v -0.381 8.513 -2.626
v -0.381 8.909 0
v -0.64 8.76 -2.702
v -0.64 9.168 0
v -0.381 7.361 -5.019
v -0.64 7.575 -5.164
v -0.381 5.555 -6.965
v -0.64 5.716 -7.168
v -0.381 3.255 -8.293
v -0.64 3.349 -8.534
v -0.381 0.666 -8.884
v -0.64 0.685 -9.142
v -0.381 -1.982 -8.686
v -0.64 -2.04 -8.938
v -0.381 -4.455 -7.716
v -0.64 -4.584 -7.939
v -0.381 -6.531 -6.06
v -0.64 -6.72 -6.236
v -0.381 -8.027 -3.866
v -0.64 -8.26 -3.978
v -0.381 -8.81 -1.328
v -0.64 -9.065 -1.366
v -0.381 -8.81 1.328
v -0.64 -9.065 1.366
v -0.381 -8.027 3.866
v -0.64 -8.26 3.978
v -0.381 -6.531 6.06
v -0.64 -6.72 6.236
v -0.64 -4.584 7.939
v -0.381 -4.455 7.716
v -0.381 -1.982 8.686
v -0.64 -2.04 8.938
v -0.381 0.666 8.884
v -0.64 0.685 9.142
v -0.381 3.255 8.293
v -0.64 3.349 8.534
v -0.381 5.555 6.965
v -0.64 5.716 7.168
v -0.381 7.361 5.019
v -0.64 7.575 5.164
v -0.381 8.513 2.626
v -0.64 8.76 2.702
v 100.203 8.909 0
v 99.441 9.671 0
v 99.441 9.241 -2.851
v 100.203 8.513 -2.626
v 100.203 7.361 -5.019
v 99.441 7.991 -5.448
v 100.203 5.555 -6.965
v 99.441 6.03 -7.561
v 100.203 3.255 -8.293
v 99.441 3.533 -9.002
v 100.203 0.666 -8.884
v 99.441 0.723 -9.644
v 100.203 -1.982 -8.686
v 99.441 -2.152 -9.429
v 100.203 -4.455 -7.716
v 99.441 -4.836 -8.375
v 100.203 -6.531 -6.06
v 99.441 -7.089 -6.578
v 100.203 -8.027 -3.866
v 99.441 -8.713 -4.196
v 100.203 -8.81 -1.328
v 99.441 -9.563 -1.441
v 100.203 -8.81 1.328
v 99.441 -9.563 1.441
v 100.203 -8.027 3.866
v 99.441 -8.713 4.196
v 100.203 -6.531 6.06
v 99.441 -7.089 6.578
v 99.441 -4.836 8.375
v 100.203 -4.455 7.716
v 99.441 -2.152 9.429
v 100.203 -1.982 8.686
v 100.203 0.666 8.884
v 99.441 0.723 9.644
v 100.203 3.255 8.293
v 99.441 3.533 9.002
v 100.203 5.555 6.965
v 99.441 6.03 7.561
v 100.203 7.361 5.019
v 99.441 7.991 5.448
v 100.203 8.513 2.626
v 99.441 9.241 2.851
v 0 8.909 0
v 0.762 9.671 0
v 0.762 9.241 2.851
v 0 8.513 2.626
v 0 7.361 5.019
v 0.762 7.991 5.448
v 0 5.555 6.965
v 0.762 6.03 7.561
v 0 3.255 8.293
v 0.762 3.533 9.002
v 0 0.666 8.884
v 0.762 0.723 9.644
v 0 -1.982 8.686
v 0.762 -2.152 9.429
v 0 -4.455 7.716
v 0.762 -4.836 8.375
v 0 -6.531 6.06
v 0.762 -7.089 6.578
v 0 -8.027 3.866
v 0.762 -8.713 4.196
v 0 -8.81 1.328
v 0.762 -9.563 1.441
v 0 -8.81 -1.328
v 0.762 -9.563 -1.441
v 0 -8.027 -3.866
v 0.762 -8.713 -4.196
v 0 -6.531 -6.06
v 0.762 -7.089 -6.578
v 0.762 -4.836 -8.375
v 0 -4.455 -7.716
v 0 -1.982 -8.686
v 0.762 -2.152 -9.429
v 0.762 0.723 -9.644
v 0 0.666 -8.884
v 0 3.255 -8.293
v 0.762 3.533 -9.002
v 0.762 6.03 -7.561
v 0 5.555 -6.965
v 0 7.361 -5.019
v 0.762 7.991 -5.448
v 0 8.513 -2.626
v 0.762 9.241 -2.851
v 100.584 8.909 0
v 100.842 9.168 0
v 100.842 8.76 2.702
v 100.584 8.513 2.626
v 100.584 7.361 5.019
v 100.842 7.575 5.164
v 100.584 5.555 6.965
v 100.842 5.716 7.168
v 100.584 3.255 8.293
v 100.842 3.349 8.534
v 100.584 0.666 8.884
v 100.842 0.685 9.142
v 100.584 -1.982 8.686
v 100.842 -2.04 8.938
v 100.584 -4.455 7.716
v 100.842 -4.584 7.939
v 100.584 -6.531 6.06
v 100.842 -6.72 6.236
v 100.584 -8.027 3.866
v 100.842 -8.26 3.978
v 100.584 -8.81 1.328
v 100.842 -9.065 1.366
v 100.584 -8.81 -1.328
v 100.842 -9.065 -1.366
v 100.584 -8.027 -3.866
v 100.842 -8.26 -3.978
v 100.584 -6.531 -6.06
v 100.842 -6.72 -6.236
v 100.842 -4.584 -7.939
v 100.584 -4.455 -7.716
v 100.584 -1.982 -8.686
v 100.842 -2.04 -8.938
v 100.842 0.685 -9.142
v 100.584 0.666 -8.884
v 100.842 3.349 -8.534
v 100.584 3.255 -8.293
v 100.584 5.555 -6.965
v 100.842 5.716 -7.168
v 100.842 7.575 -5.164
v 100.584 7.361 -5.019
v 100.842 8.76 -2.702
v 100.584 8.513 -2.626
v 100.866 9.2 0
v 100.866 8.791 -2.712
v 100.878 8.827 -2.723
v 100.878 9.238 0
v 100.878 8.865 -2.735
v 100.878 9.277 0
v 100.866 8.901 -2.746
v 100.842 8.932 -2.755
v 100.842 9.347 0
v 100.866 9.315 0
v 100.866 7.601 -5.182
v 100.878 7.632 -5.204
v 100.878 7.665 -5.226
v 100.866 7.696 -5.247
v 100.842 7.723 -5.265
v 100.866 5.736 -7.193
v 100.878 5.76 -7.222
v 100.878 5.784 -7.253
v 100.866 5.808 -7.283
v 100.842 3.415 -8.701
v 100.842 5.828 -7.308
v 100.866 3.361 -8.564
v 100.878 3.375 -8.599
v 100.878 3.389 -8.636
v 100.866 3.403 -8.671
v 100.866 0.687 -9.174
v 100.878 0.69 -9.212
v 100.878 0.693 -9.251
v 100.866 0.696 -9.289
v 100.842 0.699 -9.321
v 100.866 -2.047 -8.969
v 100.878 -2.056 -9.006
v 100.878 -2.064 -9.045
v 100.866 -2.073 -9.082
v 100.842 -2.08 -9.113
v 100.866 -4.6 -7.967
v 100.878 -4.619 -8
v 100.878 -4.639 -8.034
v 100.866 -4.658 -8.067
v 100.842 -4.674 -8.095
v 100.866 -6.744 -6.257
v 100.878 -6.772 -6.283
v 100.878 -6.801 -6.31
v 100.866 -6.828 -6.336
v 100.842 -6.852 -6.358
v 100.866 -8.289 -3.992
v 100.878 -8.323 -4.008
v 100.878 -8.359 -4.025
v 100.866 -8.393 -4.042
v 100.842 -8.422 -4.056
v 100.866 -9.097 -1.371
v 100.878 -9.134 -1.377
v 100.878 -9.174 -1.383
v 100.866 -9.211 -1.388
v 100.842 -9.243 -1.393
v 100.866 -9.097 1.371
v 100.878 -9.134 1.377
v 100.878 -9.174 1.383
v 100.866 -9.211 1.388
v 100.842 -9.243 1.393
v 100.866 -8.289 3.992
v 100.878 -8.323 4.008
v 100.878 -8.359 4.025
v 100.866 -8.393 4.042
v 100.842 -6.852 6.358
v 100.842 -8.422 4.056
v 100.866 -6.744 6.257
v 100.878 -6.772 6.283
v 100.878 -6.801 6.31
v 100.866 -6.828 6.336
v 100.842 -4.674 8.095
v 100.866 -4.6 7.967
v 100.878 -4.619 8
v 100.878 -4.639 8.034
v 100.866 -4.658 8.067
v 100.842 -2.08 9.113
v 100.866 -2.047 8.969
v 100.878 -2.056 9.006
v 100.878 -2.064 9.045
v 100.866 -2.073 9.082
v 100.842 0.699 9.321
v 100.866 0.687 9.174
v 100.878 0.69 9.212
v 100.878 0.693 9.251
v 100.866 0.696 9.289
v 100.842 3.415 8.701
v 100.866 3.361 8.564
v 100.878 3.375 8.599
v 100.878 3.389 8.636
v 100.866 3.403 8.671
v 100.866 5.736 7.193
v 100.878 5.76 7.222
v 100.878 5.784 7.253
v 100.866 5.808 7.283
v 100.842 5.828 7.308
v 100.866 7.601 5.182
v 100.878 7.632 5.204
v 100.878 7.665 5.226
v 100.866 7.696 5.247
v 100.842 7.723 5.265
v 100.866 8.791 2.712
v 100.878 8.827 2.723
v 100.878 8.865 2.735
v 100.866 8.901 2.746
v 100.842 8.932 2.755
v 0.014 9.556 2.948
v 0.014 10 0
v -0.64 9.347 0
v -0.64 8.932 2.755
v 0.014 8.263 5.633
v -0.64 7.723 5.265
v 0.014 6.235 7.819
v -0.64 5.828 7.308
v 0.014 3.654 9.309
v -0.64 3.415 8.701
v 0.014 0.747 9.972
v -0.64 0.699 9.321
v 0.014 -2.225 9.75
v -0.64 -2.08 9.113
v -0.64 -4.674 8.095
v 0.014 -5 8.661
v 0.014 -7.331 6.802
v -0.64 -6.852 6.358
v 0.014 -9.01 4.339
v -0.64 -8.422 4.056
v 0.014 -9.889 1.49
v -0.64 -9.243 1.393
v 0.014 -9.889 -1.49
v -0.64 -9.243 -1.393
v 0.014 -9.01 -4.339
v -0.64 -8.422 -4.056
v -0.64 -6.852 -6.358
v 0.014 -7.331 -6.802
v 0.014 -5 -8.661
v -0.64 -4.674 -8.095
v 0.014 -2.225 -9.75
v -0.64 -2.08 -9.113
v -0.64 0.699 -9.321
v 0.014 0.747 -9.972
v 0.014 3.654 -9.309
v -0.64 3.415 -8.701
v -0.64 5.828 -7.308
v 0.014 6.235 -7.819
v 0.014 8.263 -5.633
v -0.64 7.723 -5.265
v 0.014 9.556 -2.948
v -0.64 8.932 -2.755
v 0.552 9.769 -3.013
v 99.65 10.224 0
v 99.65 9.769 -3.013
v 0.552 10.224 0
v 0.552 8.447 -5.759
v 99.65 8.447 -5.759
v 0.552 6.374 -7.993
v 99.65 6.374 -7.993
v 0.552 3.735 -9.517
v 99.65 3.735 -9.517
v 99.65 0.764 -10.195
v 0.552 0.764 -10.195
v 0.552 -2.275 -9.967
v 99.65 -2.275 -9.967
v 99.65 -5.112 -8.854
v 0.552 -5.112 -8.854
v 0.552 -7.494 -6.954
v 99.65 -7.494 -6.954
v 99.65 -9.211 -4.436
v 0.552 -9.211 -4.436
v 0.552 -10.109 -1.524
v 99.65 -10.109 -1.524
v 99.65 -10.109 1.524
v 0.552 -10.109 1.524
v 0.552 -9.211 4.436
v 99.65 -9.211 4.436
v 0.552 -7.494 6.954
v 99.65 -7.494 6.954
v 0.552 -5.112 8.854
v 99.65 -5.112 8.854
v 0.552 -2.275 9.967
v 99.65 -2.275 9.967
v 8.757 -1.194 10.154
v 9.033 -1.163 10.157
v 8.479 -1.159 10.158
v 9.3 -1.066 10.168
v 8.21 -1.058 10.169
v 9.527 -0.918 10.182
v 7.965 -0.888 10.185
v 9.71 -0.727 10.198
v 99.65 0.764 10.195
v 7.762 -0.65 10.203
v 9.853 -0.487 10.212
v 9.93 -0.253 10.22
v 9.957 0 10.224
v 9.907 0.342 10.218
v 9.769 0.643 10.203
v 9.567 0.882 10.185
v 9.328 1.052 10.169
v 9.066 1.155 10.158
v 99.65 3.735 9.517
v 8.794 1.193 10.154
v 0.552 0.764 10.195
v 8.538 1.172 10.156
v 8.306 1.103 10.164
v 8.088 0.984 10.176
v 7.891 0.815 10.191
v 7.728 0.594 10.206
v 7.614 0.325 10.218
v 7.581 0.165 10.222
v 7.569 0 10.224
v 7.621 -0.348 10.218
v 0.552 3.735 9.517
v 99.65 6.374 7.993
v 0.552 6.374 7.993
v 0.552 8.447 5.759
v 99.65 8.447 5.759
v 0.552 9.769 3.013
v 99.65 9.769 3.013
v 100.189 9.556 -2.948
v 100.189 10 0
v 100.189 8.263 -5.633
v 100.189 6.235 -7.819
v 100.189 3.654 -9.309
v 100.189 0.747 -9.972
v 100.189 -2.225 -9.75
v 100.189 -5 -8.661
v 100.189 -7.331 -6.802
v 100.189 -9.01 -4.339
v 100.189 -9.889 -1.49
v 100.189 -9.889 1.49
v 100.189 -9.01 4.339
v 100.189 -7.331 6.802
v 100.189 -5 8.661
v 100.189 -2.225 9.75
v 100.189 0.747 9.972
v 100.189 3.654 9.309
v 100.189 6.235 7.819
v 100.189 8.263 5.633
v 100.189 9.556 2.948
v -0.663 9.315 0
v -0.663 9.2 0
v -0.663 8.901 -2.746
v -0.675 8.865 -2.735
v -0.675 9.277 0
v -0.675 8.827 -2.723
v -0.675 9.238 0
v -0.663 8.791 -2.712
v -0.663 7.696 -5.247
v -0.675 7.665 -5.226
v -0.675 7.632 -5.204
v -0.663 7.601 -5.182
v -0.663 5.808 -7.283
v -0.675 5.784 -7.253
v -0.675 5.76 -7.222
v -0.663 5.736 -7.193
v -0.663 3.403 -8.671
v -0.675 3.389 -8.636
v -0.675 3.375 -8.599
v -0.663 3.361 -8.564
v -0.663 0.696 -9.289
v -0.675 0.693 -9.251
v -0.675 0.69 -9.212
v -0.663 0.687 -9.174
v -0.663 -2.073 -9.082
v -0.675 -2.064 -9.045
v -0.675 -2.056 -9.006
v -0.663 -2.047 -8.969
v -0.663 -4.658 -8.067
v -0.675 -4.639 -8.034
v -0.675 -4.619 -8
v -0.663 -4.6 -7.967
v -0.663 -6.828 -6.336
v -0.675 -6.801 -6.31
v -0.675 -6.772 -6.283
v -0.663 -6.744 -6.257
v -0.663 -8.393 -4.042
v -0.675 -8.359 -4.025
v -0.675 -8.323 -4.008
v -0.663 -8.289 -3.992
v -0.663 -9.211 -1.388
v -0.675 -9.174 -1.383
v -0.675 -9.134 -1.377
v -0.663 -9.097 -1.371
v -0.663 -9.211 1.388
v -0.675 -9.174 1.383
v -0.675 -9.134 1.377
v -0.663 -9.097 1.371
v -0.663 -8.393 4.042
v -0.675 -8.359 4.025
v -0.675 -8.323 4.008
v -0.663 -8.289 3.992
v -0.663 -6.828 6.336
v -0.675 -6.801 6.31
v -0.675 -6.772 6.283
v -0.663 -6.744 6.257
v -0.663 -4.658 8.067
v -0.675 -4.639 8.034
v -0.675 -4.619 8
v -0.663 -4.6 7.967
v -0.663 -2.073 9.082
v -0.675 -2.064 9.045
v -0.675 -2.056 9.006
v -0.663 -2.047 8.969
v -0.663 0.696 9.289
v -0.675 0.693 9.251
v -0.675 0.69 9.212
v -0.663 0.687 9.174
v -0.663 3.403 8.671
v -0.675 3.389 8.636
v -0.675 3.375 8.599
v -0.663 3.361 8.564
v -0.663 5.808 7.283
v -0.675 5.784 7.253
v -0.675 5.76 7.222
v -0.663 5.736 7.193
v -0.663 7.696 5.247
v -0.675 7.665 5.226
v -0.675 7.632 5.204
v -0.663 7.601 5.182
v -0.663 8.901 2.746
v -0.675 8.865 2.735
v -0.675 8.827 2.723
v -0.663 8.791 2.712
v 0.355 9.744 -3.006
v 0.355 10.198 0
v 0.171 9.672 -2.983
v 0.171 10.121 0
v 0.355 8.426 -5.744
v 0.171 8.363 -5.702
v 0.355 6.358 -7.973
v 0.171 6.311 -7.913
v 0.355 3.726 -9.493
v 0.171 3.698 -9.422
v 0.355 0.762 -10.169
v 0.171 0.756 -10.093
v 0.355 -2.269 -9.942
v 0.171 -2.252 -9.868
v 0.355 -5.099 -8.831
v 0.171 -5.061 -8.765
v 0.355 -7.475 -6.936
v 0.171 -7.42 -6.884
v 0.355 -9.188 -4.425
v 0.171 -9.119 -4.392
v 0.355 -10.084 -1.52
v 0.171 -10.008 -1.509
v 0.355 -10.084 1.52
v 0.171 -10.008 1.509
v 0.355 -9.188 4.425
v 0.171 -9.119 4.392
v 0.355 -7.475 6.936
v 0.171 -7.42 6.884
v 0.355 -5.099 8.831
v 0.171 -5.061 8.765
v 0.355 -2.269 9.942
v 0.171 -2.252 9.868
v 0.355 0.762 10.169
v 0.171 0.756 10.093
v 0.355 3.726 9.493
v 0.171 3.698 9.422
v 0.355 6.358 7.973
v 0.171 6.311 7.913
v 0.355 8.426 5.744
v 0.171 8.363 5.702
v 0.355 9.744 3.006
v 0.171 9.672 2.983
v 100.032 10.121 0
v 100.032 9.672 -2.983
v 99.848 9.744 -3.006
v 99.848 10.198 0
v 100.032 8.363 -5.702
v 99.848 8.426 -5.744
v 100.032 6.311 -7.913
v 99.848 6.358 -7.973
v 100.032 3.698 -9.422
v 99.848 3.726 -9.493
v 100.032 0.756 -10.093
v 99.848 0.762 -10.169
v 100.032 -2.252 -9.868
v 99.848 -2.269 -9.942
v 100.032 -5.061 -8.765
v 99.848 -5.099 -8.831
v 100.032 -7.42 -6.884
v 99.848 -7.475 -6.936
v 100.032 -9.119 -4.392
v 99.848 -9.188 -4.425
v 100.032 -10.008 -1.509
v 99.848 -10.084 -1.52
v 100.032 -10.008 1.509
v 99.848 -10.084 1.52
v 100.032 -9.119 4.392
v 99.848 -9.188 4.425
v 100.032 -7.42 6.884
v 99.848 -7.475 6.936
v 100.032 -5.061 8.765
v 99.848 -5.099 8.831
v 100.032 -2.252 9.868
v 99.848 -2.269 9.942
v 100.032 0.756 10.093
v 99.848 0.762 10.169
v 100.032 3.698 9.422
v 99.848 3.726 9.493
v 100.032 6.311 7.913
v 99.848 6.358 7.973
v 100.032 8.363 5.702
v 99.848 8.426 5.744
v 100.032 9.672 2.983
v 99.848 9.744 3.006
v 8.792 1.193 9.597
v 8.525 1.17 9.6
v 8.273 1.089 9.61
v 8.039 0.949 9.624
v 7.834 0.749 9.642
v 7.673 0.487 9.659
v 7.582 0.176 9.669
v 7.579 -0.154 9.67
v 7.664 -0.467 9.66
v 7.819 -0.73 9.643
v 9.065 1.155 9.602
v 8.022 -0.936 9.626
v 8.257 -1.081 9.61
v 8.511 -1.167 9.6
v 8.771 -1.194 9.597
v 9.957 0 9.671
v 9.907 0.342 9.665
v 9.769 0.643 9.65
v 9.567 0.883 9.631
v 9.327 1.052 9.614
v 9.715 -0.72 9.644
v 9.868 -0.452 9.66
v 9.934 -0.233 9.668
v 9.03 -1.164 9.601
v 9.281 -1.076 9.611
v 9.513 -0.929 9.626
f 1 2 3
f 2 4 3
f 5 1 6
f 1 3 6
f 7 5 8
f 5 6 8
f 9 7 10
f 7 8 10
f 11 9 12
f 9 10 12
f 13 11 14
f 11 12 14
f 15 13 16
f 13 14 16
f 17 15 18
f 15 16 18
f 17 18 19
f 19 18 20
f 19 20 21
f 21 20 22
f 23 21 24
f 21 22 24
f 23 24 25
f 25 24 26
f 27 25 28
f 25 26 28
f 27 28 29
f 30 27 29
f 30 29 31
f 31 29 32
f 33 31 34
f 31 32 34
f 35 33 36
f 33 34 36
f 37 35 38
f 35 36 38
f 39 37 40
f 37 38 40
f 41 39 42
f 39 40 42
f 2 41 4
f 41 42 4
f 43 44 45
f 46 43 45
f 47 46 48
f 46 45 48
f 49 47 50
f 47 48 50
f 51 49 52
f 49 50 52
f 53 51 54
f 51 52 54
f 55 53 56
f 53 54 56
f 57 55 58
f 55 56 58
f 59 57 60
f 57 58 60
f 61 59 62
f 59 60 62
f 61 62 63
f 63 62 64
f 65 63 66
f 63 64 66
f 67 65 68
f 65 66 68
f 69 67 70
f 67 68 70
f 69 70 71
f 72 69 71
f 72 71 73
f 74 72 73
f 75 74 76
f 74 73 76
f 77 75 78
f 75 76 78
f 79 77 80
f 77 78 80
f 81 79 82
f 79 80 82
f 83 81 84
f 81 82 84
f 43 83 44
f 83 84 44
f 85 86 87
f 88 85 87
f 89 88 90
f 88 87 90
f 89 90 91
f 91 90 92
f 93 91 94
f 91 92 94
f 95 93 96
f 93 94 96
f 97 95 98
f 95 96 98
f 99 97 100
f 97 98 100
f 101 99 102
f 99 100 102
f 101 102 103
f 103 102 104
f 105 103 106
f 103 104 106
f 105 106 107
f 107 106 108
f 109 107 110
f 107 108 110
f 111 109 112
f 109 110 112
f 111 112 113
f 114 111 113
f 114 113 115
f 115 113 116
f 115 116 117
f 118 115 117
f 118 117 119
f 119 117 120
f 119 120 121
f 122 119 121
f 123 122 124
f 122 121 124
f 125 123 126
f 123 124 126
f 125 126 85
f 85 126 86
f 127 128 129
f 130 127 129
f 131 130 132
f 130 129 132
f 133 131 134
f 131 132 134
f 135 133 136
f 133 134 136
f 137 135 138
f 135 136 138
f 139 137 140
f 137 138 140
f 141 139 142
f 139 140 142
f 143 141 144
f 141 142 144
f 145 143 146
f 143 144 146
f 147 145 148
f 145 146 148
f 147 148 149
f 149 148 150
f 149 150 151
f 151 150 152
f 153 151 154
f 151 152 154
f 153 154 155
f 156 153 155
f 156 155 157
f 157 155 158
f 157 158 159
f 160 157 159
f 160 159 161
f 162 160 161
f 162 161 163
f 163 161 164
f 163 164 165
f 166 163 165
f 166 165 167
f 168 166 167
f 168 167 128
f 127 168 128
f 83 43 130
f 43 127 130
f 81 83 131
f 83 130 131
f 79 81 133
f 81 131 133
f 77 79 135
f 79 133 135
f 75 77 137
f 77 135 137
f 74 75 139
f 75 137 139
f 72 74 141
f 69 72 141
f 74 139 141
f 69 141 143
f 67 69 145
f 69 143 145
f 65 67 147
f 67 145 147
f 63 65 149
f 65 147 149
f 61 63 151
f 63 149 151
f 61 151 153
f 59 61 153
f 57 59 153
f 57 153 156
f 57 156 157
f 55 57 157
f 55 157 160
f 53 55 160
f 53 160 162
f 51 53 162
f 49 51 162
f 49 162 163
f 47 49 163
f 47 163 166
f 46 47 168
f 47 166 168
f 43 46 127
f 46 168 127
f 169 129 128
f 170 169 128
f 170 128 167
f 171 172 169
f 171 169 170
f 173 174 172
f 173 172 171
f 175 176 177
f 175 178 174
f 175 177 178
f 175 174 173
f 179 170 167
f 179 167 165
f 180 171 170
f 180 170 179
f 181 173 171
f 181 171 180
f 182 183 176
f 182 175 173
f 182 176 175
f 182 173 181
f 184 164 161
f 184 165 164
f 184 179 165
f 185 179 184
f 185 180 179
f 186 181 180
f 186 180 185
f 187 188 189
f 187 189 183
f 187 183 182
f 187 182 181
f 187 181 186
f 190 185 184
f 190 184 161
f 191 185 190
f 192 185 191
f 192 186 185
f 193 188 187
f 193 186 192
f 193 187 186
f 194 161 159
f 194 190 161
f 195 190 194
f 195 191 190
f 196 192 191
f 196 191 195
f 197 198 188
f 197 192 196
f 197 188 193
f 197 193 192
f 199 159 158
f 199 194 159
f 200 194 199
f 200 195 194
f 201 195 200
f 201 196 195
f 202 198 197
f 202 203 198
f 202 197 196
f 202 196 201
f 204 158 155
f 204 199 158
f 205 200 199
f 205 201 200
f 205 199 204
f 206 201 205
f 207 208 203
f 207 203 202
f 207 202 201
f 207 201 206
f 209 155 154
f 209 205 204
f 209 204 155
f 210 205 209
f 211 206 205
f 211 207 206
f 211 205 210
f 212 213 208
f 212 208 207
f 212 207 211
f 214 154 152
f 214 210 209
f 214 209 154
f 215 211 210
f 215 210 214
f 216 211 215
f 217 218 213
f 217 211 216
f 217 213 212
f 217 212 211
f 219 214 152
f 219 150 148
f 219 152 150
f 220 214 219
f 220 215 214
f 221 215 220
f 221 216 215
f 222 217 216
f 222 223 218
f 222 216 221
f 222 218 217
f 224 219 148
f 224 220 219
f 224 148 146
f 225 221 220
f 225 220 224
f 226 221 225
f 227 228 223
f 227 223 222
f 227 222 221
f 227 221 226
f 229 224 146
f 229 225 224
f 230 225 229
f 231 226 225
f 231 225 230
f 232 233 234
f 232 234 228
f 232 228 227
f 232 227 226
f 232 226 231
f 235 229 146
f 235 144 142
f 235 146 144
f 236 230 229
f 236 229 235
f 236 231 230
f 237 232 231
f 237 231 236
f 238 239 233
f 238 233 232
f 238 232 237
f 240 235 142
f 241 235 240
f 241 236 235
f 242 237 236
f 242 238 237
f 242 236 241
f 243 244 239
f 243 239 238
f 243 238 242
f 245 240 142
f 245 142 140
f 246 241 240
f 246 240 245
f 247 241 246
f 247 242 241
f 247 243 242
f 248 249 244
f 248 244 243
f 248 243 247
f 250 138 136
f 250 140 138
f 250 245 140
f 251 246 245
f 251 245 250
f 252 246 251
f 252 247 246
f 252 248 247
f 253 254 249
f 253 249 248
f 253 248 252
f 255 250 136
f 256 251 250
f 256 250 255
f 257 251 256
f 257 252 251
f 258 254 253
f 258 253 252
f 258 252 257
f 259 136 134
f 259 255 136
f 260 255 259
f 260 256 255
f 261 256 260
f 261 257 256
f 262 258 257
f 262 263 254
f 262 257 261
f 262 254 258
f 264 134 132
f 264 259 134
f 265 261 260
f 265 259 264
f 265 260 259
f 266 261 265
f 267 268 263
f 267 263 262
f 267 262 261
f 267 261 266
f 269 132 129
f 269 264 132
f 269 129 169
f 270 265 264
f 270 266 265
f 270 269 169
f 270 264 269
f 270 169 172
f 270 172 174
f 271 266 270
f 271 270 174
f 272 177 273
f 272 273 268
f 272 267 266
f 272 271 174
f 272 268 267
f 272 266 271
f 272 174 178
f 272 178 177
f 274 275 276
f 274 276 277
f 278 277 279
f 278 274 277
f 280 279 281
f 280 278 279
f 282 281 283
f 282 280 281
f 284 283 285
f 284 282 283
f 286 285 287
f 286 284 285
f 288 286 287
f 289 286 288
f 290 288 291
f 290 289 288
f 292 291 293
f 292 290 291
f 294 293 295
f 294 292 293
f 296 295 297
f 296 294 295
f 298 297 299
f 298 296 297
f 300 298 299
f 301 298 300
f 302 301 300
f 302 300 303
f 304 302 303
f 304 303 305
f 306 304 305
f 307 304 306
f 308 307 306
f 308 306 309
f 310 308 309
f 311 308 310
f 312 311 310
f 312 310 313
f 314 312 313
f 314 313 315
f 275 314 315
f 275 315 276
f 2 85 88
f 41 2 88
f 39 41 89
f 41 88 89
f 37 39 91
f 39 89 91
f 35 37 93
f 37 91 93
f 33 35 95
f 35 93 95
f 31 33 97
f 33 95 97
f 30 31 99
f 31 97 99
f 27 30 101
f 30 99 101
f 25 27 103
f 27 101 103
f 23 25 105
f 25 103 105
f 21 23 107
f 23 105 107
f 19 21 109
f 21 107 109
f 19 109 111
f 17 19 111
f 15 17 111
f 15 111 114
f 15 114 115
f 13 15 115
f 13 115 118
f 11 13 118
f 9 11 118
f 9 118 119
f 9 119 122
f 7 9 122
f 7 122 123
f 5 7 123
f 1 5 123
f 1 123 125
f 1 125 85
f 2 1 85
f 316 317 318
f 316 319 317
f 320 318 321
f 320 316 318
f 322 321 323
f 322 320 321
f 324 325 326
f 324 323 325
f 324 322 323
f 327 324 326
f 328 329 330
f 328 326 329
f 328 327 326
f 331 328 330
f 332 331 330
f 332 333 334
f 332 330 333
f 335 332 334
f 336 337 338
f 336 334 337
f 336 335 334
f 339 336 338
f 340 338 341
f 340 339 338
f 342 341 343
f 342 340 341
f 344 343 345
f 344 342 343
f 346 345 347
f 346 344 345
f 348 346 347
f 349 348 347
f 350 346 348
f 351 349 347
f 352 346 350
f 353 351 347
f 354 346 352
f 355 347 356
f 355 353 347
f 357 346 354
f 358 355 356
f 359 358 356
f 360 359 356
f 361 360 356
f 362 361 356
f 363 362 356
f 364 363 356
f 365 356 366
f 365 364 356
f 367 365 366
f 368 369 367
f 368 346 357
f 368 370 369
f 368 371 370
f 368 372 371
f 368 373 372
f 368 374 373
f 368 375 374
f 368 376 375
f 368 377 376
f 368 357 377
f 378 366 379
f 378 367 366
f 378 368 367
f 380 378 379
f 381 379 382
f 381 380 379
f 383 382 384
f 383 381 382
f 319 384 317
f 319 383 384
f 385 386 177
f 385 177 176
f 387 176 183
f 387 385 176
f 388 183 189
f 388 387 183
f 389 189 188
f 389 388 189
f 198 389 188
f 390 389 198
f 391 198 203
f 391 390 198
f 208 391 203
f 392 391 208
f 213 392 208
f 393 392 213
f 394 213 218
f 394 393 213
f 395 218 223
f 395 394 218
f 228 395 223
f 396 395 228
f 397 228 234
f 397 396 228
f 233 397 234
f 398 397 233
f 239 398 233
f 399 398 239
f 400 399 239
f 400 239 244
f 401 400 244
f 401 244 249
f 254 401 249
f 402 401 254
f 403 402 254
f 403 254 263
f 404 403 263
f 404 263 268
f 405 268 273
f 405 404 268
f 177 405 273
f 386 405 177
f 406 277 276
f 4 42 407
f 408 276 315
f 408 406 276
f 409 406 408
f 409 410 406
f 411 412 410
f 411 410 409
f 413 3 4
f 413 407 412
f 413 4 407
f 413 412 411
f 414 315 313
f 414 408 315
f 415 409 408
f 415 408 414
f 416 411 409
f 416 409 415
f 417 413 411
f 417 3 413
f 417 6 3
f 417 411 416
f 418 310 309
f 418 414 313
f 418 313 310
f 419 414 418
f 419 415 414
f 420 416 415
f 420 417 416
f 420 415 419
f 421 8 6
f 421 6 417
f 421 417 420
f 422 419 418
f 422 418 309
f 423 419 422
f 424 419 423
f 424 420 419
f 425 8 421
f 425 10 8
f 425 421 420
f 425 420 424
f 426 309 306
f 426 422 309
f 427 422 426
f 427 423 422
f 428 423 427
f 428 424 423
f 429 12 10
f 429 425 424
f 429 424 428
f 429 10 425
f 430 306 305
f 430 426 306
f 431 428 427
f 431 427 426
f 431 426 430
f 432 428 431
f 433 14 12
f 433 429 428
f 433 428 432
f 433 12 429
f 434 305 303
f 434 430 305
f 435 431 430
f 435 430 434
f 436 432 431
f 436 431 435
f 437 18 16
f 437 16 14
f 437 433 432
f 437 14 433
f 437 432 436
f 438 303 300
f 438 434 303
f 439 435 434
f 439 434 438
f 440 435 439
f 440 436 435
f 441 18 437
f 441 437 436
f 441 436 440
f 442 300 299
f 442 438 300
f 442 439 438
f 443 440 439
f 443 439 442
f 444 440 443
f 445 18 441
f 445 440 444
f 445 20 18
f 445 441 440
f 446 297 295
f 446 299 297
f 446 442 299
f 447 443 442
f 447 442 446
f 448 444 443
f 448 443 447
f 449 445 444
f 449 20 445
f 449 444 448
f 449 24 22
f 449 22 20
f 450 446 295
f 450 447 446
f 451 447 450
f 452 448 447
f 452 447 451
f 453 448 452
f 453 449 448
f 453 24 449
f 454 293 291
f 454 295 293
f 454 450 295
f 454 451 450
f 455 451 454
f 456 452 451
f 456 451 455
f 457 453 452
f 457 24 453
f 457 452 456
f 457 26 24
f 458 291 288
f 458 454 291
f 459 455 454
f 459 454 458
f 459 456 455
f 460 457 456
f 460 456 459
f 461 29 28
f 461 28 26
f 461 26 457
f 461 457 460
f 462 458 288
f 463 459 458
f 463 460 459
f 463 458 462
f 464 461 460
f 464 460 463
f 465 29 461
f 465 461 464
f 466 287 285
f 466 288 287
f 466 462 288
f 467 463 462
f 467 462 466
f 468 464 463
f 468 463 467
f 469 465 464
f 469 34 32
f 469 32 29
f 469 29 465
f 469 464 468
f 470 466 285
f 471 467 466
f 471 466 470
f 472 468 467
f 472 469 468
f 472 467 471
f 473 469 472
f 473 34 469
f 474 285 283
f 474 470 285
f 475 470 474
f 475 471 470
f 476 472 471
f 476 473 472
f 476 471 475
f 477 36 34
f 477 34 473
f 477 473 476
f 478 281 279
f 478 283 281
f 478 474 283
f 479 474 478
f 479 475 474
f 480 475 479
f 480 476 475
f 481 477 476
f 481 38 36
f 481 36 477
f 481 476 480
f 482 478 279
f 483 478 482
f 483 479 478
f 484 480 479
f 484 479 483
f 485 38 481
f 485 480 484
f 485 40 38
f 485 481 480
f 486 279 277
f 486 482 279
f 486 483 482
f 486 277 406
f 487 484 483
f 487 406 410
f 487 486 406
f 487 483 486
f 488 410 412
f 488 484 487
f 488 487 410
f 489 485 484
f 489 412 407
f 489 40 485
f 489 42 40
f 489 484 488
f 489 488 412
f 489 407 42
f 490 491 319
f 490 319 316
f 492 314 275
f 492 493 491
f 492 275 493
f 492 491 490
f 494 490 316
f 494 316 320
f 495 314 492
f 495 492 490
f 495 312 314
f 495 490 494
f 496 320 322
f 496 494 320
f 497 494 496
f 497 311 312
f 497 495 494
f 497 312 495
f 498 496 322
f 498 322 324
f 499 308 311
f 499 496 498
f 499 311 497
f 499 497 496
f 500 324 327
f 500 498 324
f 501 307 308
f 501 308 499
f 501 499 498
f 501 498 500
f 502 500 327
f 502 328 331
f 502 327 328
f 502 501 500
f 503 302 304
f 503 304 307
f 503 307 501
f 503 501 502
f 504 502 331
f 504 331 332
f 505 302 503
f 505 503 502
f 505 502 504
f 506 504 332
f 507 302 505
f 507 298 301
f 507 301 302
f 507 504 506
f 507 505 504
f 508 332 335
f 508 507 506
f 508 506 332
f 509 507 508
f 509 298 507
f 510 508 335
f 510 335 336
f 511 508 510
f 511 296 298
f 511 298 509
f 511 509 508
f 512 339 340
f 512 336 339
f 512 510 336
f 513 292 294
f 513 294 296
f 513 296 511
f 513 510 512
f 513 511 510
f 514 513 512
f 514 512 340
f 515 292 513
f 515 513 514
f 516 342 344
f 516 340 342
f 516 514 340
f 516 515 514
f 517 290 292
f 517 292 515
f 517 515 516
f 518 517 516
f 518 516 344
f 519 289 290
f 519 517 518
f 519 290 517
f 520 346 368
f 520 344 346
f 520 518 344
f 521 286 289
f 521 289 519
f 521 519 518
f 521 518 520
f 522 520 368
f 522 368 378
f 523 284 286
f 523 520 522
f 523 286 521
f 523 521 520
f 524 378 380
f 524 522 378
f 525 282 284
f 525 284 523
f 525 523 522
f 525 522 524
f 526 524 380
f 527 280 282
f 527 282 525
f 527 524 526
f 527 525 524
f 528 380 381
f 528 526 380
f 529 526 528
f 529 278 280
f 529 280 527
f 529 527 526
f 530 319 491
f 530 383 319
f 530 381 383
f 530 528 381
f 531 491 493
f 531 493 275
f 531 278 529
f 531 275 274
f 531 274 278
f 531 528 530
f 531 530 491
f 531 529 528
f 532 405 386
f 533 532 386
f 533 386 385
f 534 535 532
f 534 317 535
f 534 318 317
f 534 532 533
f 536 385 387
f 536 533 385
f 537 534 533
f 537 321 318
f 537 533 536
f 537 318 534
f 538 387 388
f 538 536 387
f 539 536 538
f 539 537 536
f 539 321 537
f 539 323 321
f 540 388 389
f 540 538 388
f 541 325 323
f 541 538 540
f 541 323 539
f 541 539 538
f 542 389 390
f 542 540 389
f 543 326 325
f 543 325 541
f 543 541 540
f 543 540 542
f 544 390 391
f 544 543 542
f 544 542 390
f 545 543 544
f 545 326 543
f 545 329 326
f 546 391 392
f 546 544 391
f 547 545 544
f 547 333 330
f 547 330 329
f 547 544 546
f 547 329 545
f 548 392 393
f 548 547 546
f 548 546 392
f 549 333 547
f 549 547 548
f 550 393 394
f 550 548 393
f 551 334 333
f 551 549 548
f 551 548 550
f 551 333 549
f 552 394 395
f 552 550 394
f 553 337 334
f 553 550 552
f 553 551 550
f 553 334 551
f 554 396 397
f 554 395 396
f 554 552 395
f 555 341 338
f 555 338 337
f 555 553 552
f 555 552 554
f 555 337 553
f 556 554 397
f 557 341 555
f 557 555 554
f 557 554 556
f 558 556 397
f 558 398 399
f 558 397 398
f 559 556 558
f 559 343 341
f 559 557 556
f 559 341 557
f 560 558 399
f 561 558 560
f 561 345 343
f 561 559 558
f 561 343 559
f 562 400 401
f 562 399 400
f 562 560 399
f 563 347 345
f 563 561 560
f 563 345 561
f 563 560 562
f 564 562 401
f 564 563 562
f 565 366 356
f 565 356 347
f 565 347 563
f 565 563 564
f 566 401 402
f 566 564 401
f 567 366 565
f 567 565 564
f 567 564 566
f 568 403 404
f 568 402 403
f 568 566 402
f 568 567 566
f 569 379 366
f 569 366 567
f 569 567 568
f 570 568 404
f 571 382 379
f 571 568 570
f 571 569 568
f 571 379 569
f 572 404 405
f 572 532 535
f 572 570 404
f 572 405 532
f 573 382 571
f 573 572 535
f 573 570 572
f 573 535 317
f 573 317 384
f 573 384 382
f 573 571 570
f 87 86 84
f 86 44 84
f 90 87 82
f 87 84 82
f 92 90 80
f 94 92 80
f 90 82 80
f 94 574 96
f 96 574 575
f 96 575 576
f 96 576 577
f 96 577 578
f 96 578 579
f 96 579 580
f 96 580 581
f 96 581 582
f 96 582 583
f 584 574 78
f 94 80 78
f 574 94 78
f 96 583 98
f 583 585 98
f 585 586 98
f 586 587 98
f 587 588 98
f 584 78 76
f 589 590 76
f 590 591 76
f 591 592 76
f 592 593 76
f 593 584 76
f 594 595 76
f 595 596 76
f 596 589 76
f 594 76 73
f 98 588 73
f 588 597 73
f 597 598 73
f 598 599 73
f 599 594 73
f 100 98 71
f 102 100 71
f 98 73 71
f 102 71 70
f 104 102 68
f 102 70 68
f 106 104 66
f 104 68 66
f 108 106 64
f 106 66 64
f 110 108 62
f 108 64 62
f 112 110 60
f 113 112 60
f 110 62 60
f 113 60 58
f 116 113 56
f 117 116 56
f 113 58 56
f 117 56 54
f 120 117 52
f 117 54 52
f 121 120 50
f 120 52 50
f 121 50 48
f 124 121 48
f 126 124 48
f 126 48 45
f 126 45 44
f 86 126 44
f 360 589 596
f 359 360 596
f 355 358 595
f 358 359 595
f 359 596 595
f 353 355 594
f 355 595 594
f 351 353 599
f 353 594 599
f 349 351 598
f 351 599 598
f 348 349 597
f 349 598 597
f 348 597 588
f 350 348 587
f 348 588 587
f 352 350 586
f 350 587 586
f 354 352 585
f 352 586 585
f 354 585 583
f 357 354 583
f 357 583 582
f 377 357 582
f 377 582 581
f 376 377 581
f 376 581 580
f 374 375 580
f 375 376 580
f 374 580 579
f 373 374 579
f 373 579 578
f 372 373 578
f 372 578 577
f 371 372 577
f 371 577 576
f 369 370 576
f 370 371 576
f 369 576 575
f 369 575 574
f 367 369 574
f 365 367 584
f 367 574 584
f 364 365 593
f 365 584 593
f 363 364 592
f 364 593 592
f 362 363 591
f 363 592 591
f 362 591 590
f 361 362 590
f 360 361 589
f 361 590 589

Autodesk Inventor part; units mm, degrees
sketch "Sketch_1" plane through (0, 0, 0) normal (0, 0, 1) x (1, 0, 0)
  line L0 (100.203, 0) -> (0, 0)
  arc A0 (-0.6395, 9.3472) -> (-0.6395, 9.1676) centre (-0.5497, 9.2574) ccw
  line L1 (-0.6395, 9.1676) -> (-0.381, 8.9091)
  line L2 (-0.381, 8.9091) -> (0, 8.9091)
  line L3 (0, 8.9091) -> (0.762, 9.671)
  line L4 (0.762, 9.671) -> (99.441, 9.671)
  line L5 (99.441, 9.671) -> (100.203, 8.9091)
  line L6 (100.203, 8.9091) -> (100.584, 8.9091)
  line L7 (100.584, 8.9091) -> (100.8425, 9.1676)
  arc A1 (100.8425, 9.1676) -> (100.8425, 9.3472) centre (100.7527, 9.2574) ccw
  line L8 (100.8425, 9.3472) -> (100.1894, 10.0003)
  arc A2 (100.1894, 10.0003) -> (99.6505, 10.2235) centre (99.6506, 9.4615) ccw
  line L9 (99.6505, 10.2235) -> (0.5524, 10.2235)
  arc A3 (0.5524, 10.2235) -> (0.0136, 10.0003) centre (0.5524, 9.4615) ccw
  line L10 (0.0136, 10.0003) -> (-0.6395, 9.3472)
revolve "Revolution1" add sketch "Sketch_1" angle 360 about axis through (100.203, 0, 0) along (1, 0, 0)
sketch "Sketch_4" plane through (0, 0, 0) normal (0, 0, 1) x (1, 0, 0)
  circle A0 centre (8.763, 0) radius 1.1938
extrude "Extrusion1" cut sketch "Sketch_4" along normal blind 10.2235
ref_plane "cp1_XY" through (50.1015, 10.2235, 0) normal (1, 0, 0) x (0, 0, -1)
ref_plane "cp1_YZ" through (50.1015, 10.2235, 0) normal (0, 0, -1) x (0, 1, 0)
ref_plane "cp1_ZX" through (50.1015, 10.2235, 0) normal (0, 1, 0) x (1, 0, 0)
ref_plane "cp2_XY" through (50.1015, 0, -10.2235) normal (1, 0, 0) x (0, 0, -1)
ref_plane "cp2_YZ" through (50.1015, 0, -10.2235) normal (0, 0, -1) x (0, 1, 0)
ref_plane "cp2_ZX" through (50.1015, 0, -10.2235) normal (0, 1, 0) x (1, 0, 0)
ref_plane "cp3_XY" through (50.1015, -10.2235, 0) normal (1, 0, 0) x (0, 0, -1)
ref_plane "cp3_YZ" through (50.1015, -10.2235, 0) normal (0, 0, -1) x (0, 1, 0)
ref_plane "cp3_ZX" through (50.1015, -10.2235, 0) normal (0, 1, 0) x (1, 0, 0)
ref_plane "cp4_XY" through (50.1015, 0, 10.2235) normal (1, 0, 0) x (0, 0, -1)
ref_plane "cp4_YZ" through (50.1015, 0, 10.2235) normal (0, 0, -1) x (0, 1, 0)
ref_plane "cp4_ZX" through (50.1015, 0, 10.2235) normal (0, 1, 0) x (1, 0, 0)
ref_plane "tube_front_XY" through (0, 0, 0) normal (1, 0, 0) x (0, 0, -1)
ref_plane "tube_front_YZ" through (0, 0, 0) normal (0, 0, -1) x (0, 1, 0)
ref_plane "tube_front_ZX" through (0, 0, 0) normal (0, 1, 0) x (1, 0, 0)
ref_plane "tube_rear_XY" through (100.203, 0, 0) normal (1, 0, 0) x (0, 0, -1)
ref_plane "tube_rear_YZ" through (100.203, 0, 0) normal (0, 0, -1) x (0, 1, 0)
ref_plane "tube_rear_ZX" through (100.203, 0, 0) normal (0, 1, 0) x (1, 0, 0)
properties part number "04-3.9452C" material "Stainless Steel"
